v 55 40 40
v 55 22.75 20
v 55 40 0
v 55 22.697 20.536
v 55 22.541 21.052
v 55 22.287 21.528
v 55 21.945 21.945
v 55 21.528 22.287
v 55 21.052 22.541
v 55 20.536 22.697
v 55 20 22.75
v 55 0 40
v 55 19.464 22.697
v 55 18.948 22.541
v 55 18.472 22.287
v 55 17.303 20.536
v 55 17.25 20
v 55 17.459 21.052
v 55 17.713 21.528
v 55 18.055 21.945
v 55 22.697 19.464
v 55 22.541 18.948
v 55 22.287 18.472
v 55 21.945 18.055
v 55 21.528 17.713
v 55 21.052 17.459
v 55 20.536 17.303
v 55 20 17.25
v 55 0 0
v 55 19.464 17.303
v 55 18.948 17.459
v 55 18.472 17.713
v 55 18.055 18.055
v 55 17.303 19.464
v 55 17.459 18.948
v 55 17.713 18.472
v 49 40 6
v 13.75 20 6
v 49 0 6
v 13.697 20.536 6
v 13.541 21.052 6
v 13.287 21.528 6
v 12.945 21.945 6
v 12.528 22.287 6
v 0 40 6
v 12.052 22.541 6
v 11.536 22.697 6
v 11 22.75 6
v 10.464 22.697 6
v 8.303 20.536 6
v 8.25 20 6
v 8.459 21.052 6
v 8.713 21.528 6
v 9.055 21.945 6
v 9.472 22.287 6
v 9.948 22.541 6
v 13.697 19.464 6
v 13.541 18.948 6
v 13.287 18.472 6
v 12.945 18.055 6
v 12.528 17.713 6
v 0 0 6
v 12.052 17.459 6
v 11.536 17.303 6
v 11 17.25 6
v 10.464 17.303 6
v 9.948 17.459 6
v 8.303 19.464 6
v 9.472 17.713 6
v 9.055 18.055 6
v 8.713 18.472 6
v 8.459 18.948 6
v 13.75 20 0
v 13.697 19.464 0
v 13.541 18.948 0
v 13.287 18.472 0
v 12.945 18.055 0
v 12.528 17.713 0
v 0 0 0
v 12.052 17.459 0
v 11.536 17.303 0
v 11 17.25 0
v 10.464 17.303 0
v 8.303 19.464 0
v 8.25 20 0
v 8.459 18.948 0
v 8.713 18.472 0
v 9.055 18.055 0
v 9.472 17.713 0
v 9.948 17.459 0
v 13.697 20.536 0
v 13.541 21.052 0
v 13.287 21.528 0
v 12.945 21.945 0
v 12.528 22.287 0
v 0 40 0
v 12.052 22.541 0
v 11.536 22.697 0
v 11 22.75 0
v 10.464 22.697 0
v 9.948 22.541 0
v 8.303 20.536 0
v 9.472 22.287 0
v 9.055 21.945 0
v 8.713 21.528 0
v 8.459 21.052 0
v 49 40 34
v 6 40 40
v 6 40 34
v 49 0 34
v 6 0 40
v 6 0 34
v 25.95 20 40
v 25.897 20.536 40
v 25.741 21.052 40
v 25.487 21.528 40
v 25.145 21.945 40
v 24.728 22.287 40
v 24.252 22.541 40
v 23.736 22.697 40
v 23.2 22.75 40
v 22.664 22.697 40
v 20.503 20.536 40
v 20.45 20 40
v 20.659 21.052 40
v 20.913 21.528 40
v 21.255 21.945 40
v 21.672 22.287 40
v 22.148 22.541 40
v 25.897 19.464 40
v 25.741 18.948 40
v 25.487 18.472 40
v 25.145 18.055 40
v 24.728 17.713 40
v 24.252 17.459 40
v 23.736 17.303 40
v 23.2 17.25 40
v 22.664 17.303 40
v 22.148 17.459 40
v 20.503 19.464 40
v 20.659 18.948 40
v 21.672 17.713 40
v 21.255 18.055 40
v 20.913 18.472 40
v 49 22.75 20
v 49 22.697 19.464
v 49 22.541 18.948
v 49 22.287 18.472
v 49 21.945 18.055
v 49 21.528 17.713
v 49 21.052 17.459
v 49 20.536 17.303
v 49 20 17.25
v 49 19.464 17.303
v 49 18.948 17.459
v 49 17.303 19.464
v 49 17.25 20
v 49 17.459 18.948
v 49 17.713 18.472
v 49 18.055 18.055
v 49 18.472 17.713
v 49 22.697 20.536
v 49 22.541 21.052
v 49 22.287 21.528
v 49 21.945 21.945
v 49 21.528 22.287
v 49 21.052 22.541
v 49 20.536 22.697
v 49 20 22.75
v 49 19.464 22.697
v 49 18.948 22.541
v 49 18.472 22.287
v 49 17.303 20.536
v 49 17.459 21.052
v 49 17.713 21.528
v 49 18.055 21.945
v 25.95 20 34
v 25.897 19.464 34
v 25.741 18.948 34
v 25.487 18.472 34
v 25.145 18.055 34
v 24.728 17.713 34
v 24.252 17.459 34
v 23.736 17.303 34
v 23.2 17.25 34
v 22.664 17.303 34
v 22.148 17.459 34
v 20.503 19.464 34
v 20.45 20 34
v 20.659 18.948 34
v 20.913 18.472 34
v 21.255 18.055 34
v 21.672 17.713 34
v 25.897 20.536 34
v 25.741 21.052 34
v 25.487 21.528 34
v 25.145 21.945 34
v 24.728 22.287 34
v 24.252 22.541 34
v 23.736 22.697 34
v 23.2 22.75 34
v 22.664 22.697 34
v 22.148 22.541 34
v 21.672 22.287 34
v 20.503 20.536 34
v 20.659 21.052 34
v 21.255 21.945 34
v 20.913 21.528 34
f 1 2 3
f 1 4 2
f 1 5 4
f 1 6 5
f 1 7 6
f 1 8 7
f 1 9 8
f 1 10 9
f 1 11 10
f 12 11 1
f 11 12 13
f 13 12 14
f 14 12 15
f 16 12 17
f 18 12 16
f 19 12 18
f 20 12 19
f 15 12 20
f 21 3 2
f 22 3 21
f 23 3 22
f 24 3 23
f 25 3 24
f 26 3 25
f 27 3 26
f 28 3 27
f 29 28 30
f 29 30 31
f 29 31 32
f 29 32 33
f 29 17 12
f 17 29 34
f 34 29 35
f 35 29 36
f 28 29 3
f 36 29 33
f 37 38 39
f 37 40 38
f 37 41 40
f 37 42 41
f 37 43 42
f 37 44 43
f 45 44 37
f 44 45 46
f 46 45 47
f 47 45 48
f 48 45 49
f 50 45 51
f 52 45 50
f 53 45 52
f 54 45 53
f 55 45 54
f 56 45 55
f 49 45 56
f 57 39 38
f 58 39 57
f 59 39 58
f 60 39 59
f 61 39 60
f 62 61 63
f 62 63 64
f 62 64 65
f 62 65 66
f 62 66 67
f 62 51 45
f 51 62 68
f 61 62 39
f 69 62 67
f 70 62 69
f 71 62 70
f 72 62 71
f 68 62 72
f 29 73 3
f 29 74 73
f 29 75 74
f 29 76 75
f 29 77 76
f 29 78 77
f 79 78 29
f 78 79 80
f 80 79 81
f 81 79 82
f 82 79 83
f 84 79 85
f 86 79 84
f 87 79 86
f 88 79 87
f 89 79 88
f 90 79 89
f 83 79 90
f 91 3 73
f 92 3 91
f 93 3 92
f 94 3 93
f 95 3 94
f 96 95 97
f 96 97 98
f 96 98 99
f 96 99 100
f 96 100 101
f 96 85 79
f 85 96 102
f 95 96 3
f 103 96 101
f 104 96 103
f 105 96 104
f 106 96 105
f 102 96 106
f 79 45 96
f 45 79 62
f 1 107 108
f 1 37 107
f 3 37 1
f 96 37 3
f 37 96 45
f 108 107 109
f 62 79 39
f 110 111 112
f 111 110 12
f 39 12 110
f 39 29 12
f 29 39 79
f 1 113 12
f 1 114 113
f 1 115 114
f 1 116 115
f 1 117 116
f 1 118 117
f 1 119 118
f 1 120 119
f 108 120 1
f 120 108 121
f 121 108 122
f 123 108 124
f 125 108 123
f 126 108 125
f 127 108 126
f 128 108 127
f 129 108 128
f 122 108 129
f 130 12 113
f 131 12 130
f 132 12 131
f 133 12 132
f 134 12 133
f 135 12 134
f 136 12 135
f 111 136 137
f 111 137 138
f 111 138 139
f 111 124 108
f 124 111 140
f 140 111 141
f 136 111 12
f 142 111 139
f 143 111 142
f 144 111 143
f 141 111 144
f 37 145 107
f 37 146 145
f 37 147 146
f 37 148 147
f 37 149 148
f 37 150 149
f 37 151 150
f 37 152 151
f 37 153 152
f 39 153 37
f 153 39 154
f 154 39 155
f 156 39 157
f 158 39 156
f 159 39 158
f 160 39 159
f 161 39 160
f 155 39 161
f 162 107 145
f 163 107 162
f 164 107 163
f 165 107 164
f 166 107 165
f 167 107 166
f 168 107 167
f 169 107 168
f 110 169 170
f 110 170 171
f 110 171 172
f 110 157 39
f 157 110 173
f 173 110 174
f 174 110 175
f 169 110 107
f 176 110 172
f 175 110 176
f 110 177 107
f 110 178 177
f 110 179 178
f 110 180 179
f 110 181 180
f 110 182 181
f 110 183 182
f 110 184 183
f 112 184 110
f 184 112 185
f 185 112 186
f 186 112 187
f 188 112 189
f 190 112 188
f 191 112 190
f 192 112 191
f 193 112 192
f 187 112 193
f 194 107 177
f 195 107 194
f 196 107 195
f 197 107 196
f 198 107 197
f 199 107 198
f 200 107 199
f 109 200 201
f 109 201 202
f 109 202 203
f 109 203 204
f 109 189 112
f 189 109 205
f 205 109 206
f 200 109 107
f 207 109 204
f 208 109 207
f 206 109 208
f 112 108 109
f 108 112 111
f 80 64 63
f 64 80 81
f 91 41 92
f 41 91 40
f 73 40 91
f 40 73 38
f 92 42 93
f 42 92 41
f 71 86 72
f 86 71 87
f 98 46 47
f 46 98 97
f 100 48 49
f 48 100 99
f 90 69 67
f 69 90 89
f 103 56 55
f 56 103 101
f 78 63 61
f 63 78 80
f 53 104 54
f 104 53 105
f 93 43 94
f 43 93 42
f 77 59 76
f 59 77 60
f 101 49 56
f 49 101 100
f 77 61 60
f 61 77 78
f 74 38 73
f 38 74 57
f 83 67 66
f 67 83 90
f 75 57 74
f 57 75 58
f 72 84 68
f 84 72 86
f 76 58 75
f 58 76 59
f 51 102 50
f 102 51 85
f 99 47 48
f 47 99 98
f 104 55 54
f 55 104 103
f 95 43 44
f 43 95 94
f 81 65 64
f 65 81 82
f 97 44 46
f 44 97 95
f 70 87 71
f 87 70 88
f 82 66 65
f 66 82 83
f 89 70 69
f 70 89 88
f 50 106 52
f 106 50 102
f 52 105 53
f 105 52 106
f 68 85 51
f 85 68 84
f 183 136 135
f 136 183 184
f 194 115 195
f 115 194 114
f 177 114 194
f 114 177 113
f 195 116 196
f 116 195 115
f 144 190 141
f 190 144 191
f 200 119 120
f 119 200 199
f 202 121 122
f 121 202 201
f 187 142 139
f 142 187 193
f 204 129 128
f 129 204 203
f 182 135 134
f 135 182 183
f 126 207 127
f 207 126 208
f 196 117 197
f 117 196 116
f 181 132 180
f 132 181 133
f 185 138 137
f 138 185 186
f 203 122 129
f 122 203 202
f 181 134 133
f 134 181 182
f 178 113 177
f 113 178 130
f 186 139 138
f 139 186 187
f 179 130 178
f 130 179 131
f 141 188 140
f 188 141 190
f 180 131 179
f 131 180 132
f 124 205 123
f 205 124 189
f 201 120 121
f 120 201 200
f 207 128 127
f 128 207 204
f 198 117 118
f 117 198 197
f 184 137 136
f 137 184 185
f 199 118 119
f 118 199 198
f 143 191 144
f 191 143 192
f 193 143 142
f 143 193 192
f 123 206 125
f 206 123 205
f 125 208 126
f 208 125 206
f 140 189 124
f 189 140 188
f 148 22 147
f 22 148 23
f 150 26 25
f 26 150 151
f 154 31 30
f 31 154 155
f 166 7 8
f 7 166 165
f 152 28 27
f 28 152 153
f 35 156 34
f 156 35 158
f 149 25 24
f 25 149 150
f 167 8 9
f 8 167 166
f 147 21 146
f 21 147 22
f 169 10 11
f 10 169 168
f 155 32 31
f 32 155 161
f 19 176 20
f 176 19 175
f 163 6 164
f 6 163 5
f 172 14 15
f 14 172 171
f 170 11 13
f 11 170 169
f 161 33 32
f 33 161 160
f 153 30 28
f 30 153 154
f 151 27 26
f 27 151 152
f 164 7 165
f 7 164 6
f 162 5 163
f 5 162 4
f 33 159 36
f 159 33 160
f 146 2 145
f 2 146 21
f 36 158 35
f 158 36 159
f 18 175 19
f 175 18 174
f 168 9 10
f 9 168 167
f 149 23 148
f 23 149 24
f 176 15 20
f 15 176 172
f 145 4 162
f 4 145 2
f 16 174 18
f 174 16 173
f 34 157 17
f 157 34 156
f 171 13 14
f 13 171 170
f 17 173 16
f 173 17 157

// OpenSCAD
$fn = 32;
// ----------------------------------------------------------------------
// Z-bracket: 55 x 40 x 40 mm
// ----------------------------------------------------------------------

// --- parameters (mm) ---
bottom_run = 55;          // lower foot length, X
top_run = 43;             // upper foot length, X
profile_w = 40;           // bracket width, Y
height = 40;              // overall rise, Z
mat_t = 6;                // plate thickness
hole_d = 5.5;             // clearance for M5

module hole_z(px, py, z0) {
  translate([px, py, z0 - 2.5]) cylinder(h = mat_t + 5, d = hole_d);
}
module hole_x(py, pz) {
  translate([-2.5, py, pz]) rotate([0, 90, 0]) cylinder(h = mat_t + 5, d = hole_d);
}

difference() {
  union() {
    cube([bottom_run, profile_w, mat_t]);
    /* web, overlapping the lower foot */
    translate([bottom_run - mat_t, 0, 0]) cube([mat_t, profile_w, height]);
    /* upper foot, sunk into the web */
    translate([bottom_run - mat_t - top_run, 0, height - mat_t]) cube([top_run + mat_t, profile_w, mat_t]);
  }
  hole_z(11, 20, 0);
  translate([bottom_run - mat_t - 25.8, 0, 0]) hole_z(0, 20, height - mat_t);
  translate([bottom_run - mat_t, 0, 0]) hole_x(20, 20);
}
